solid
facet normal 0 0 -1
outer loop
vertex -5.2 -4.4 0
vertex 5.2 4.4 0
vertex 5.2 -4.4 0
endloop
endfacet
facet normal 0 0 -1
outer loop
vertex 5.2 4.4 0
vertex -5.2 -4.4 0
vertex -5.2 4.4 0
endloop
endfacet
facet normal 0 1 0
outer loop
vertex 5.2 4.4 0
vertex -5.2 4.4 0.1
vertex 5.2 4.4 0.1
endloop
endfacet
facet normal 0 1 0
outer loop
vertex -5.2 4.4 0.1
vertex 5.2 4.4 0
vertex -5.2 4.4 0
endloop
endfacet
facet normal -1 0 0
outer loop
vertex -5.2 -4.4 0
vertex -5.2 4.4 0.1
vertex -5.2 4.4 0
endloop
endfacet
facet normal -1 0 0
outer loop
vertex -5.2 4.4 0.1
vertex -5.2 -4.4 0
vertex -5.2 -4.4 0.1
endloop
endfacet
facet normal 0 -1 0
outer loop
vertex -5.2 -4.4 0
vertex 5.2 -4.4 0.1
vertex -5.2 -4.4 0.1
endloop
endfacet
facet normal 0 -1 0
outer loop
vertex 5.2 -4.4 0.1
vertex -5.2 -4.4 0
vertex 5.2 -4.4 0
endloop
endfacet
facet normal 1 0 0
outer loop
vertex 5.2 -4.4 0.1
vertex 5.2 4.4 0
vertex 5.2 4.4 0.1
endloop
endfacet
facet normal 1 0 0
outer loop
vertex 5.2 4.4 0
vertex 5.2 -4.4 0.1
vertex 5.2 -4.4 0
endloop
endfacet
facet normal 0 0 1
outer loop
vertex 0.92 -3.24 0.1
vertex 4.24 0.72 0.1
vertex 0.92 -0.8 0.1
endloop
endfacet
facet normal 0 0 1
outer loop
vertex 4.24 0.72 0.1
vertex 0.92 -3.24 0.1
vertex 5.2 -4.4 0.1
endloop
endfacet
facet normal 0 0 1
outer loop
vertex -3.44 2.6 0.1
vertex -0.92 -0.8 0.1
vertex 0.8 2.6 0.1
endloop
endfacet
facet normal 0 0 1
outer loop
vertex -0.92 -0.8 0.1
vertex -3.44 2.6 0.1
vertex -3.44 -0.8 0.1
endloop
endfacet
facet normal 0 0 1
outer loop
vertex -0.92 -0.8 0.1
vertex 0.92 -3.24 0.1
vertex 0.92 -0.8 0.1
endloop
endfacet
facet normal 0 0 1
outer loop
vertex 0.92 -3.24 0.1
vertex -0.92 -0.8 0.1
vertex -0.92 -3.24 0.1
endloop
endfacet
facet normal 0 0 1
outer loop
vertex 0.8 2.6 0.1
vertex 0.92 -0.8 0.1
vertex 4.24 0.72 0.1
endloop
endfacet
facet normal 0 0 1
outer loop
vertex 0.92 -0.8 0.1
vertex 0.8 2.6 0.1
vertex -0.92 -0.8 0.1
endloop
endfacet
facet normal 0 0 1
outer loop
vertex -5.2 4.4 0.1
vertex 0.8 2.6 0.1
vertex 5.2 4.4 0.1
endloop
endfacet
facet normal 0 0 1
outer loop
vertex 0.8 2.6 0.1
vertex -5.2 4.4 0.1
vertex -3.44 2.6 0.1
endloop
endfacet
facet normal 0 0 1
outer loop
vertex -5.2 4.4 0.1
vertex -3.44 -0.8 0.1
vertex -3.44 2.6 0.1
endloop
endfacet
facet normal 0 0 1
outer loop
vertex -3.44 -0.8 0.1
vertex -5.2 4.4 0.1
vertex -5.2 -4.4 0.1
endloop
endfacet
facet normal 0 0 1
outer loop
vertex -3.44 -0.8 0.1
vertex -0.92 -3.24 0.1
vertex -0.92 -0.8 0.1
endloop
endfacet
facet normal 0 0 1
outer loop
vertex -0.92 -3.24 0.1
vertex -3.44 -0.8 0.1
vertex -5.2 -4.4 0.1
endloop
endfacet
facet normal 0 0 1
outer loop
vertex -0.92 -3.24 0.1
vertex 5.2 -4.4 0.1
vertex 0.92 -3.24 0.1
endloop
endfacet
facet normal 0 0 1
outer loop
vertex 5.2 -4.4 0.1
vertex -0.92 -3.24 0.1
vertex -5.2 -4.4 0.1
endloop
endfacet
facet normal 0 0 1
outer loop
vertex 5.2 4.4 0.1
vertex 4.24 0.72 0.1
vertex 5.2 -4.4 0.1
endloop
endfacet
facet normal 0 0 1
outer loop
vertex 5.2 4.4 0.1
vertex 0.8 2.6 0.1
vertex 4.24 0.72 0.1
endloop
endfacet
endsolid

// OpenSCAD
// file: ../p/box5-12.scad
use <../lib.scad>
function ldraw_lib__box5_12() = [
// 0 Box with 5 Faces without Any Edges
// 0 Name: box5-12.dat
// 0 Author: Chris Dee [cwdee]
// 0 !LDRAW_ORG Primitive UPDATE 2009-02
// 0 !LICENSE Licensed under CC BY 2.0 and CC BY 4.0 : see CAreadme.txt
// 
// 0 BFC CERTIFY CCW
  [0,"BFC","CERTIFY"],
  [0,"BFC","CCW"],
// 
// 0 !HISTORY 2009-09-03 [PTadmin] Official Update 2009-02
// 
// 
// 4 16 1 1 1 1 1 -1 -1 1 -1 -1 1 1
  [4,16,1,1,1,1,1,-1,-1,1,-1,-1,1,1],
// 4 16 -1 0 1 1 0 1 1 1 1 -1 1 1
  [4,16,-1,0,1,1,0,1,1,1,1,-1,1,1],
// 4 16 -1 0 -1 -1 0 1 -1 1 1 -1 1 -1
  [4,16,-1,0,-1,-1,0,1,-1,1,1,-1,1,-1],
// 4 16 1 0 -1 -1 0 -1 -1 1 -1 1 1 -1
  [4,16,1,0,-1,-1,0,-1,-1,1,-1,1,1,-1],
// 4 16 1 0 1 1 0 -1 1 1 -1 1 1 1
  [4,16,1,0,1,1,0,-1,1,1,-1,1,1,1],
// 0
];
makepoly(ldraw_lib__box5_12(), line=0.2);
// main file
use <../lib.scad>
use <../p/box5-12.scad>
function ldraw_lib__195985c() = [
// 0 Sticker  1.1 x  1.3 with Yellow Hammer on Black Background
// 0 Name: 195985c.dat
// 0 Author: Takeshi Takahashi [RainbowDolphin]
// 0 !LDRAW_ORG Part UPDATE 2022-05
// 0 !LICENSE Licensed under CC BY 2.0 and CC BY 4.0 : see CAreadme.txt
// 
// 0 BFC CERTIFY CCW
  [0,"BFC","CERTIFY"],
  [0,"BFC","CCW"],
// 
// 0 !KEYWORDS Bricklink 6373stk01, Brickowl 426334, Motorcycle shop
// 0 !KEYWORDS Rebrickable 195985, Repair, Set 6373
// 
// 0 !HISTORY 2021-09-26 [RainbowDolphin] Created based on 3010p03 by Chris Dee [cwdee]
// 0 !HISTORY 2022-09-15 [PTadmin] Official Update 2022-05
// 
// 
// 1 16 0 -0.25 0 13 0 0 0 0.25 0 0 0 11 box5-12.dat
  [1,16,0,-0.25,0,13,0,0,0,0.25,0,0,0,11, ldraw_lib__box5_12()],
// 4 0 10.6 -0.25 1.8 2.3 -0.25 -2 2.3 -0.25 -8.1 13 -0.25 -11
  [4,0,10.6,-0.25,1.8,2.3,-0.25,-2,2.3,-0.25,-8.1,13,-0.25,-11],
// 4 14 2 -0.25 6.5 -8.6 -0.25 6.5 -8.6 -0.25 -2 -2.3 -0.25 -2
  [4,14,2,-0.25,6.5,-8.6,-0.25,6.5,-8.6,-0.25,-2,-2.3,-0.25,-2],
// 4 14 -2.3 -0.25 -8.1 2.3 -0.25 -8.1 2.3 -0.25 -2 -2.3 -0.25 -2
  [4,14,-2.3,-0.25,-8.1,2.3,-0.25,-8.1,2.3,-0.25,-2,-2.3,-0.25,-2],
// 4 14 2.3 -0.25 -2 10.6 -0.25 1.8 2 -0.25 6.5 -2.3 -0.25 -2
  [4,14,2.3,-0.25,-2,10.6,-0.25,1.8,2,-0.25,6.5,-2.3,-0.25,-2],
// 4 0 2 -.25 6.5 13 -.25 11 -13 -.25 11 -8.6 -.25 6.5
  [4,0,2,-.25,6.5,13,-.25,11,-13,-.25,11,-8.6,-.25,6.5],
// 4 0 -8.6 -.25 -2 -8.6 -.25 6.5 -13 -.25 11 -13 -.25 -11
  [4,0,-8.6,-.25,-2,-8.6,-.25,6.5,-13,-.25,11,-13,-.25,-11],
// 4 0 -2.3 -.25 -2 -8.6 -.25 -2 -13 -.25 -11 -2.3 -.25 -8.1
  [4,0,-2.3,-.25,-2,-8.6,-.25,-2,-13,-.25,-11,-2.3,-.25,-8.1],
// 4 0 2.3 -.25 -8.1 -2.3 -.25 -8.1 -13 -.25 -11 13 -.25 -11
  [4,0,2.3,-.25,-8.1,-2.3,-.25,-8.1,-13,-.25,-11,13,-.25,-11],
// 3 0 13 -.25 11 10.6 -.25 1.8 13 -.25 -11
  [3,0,13,-.25,11,10.6,-.25,1.8,13,-.25,-11],
// 3 0 13 -.25 11 2 -.25 6.5 10.6 -.25 1.8
  [3,0,13,-.25,11,2,-.25,6.5,10.6,-.25,1.8],
];
makepoly(ldraw_lib__195985c(), line=0.2);
